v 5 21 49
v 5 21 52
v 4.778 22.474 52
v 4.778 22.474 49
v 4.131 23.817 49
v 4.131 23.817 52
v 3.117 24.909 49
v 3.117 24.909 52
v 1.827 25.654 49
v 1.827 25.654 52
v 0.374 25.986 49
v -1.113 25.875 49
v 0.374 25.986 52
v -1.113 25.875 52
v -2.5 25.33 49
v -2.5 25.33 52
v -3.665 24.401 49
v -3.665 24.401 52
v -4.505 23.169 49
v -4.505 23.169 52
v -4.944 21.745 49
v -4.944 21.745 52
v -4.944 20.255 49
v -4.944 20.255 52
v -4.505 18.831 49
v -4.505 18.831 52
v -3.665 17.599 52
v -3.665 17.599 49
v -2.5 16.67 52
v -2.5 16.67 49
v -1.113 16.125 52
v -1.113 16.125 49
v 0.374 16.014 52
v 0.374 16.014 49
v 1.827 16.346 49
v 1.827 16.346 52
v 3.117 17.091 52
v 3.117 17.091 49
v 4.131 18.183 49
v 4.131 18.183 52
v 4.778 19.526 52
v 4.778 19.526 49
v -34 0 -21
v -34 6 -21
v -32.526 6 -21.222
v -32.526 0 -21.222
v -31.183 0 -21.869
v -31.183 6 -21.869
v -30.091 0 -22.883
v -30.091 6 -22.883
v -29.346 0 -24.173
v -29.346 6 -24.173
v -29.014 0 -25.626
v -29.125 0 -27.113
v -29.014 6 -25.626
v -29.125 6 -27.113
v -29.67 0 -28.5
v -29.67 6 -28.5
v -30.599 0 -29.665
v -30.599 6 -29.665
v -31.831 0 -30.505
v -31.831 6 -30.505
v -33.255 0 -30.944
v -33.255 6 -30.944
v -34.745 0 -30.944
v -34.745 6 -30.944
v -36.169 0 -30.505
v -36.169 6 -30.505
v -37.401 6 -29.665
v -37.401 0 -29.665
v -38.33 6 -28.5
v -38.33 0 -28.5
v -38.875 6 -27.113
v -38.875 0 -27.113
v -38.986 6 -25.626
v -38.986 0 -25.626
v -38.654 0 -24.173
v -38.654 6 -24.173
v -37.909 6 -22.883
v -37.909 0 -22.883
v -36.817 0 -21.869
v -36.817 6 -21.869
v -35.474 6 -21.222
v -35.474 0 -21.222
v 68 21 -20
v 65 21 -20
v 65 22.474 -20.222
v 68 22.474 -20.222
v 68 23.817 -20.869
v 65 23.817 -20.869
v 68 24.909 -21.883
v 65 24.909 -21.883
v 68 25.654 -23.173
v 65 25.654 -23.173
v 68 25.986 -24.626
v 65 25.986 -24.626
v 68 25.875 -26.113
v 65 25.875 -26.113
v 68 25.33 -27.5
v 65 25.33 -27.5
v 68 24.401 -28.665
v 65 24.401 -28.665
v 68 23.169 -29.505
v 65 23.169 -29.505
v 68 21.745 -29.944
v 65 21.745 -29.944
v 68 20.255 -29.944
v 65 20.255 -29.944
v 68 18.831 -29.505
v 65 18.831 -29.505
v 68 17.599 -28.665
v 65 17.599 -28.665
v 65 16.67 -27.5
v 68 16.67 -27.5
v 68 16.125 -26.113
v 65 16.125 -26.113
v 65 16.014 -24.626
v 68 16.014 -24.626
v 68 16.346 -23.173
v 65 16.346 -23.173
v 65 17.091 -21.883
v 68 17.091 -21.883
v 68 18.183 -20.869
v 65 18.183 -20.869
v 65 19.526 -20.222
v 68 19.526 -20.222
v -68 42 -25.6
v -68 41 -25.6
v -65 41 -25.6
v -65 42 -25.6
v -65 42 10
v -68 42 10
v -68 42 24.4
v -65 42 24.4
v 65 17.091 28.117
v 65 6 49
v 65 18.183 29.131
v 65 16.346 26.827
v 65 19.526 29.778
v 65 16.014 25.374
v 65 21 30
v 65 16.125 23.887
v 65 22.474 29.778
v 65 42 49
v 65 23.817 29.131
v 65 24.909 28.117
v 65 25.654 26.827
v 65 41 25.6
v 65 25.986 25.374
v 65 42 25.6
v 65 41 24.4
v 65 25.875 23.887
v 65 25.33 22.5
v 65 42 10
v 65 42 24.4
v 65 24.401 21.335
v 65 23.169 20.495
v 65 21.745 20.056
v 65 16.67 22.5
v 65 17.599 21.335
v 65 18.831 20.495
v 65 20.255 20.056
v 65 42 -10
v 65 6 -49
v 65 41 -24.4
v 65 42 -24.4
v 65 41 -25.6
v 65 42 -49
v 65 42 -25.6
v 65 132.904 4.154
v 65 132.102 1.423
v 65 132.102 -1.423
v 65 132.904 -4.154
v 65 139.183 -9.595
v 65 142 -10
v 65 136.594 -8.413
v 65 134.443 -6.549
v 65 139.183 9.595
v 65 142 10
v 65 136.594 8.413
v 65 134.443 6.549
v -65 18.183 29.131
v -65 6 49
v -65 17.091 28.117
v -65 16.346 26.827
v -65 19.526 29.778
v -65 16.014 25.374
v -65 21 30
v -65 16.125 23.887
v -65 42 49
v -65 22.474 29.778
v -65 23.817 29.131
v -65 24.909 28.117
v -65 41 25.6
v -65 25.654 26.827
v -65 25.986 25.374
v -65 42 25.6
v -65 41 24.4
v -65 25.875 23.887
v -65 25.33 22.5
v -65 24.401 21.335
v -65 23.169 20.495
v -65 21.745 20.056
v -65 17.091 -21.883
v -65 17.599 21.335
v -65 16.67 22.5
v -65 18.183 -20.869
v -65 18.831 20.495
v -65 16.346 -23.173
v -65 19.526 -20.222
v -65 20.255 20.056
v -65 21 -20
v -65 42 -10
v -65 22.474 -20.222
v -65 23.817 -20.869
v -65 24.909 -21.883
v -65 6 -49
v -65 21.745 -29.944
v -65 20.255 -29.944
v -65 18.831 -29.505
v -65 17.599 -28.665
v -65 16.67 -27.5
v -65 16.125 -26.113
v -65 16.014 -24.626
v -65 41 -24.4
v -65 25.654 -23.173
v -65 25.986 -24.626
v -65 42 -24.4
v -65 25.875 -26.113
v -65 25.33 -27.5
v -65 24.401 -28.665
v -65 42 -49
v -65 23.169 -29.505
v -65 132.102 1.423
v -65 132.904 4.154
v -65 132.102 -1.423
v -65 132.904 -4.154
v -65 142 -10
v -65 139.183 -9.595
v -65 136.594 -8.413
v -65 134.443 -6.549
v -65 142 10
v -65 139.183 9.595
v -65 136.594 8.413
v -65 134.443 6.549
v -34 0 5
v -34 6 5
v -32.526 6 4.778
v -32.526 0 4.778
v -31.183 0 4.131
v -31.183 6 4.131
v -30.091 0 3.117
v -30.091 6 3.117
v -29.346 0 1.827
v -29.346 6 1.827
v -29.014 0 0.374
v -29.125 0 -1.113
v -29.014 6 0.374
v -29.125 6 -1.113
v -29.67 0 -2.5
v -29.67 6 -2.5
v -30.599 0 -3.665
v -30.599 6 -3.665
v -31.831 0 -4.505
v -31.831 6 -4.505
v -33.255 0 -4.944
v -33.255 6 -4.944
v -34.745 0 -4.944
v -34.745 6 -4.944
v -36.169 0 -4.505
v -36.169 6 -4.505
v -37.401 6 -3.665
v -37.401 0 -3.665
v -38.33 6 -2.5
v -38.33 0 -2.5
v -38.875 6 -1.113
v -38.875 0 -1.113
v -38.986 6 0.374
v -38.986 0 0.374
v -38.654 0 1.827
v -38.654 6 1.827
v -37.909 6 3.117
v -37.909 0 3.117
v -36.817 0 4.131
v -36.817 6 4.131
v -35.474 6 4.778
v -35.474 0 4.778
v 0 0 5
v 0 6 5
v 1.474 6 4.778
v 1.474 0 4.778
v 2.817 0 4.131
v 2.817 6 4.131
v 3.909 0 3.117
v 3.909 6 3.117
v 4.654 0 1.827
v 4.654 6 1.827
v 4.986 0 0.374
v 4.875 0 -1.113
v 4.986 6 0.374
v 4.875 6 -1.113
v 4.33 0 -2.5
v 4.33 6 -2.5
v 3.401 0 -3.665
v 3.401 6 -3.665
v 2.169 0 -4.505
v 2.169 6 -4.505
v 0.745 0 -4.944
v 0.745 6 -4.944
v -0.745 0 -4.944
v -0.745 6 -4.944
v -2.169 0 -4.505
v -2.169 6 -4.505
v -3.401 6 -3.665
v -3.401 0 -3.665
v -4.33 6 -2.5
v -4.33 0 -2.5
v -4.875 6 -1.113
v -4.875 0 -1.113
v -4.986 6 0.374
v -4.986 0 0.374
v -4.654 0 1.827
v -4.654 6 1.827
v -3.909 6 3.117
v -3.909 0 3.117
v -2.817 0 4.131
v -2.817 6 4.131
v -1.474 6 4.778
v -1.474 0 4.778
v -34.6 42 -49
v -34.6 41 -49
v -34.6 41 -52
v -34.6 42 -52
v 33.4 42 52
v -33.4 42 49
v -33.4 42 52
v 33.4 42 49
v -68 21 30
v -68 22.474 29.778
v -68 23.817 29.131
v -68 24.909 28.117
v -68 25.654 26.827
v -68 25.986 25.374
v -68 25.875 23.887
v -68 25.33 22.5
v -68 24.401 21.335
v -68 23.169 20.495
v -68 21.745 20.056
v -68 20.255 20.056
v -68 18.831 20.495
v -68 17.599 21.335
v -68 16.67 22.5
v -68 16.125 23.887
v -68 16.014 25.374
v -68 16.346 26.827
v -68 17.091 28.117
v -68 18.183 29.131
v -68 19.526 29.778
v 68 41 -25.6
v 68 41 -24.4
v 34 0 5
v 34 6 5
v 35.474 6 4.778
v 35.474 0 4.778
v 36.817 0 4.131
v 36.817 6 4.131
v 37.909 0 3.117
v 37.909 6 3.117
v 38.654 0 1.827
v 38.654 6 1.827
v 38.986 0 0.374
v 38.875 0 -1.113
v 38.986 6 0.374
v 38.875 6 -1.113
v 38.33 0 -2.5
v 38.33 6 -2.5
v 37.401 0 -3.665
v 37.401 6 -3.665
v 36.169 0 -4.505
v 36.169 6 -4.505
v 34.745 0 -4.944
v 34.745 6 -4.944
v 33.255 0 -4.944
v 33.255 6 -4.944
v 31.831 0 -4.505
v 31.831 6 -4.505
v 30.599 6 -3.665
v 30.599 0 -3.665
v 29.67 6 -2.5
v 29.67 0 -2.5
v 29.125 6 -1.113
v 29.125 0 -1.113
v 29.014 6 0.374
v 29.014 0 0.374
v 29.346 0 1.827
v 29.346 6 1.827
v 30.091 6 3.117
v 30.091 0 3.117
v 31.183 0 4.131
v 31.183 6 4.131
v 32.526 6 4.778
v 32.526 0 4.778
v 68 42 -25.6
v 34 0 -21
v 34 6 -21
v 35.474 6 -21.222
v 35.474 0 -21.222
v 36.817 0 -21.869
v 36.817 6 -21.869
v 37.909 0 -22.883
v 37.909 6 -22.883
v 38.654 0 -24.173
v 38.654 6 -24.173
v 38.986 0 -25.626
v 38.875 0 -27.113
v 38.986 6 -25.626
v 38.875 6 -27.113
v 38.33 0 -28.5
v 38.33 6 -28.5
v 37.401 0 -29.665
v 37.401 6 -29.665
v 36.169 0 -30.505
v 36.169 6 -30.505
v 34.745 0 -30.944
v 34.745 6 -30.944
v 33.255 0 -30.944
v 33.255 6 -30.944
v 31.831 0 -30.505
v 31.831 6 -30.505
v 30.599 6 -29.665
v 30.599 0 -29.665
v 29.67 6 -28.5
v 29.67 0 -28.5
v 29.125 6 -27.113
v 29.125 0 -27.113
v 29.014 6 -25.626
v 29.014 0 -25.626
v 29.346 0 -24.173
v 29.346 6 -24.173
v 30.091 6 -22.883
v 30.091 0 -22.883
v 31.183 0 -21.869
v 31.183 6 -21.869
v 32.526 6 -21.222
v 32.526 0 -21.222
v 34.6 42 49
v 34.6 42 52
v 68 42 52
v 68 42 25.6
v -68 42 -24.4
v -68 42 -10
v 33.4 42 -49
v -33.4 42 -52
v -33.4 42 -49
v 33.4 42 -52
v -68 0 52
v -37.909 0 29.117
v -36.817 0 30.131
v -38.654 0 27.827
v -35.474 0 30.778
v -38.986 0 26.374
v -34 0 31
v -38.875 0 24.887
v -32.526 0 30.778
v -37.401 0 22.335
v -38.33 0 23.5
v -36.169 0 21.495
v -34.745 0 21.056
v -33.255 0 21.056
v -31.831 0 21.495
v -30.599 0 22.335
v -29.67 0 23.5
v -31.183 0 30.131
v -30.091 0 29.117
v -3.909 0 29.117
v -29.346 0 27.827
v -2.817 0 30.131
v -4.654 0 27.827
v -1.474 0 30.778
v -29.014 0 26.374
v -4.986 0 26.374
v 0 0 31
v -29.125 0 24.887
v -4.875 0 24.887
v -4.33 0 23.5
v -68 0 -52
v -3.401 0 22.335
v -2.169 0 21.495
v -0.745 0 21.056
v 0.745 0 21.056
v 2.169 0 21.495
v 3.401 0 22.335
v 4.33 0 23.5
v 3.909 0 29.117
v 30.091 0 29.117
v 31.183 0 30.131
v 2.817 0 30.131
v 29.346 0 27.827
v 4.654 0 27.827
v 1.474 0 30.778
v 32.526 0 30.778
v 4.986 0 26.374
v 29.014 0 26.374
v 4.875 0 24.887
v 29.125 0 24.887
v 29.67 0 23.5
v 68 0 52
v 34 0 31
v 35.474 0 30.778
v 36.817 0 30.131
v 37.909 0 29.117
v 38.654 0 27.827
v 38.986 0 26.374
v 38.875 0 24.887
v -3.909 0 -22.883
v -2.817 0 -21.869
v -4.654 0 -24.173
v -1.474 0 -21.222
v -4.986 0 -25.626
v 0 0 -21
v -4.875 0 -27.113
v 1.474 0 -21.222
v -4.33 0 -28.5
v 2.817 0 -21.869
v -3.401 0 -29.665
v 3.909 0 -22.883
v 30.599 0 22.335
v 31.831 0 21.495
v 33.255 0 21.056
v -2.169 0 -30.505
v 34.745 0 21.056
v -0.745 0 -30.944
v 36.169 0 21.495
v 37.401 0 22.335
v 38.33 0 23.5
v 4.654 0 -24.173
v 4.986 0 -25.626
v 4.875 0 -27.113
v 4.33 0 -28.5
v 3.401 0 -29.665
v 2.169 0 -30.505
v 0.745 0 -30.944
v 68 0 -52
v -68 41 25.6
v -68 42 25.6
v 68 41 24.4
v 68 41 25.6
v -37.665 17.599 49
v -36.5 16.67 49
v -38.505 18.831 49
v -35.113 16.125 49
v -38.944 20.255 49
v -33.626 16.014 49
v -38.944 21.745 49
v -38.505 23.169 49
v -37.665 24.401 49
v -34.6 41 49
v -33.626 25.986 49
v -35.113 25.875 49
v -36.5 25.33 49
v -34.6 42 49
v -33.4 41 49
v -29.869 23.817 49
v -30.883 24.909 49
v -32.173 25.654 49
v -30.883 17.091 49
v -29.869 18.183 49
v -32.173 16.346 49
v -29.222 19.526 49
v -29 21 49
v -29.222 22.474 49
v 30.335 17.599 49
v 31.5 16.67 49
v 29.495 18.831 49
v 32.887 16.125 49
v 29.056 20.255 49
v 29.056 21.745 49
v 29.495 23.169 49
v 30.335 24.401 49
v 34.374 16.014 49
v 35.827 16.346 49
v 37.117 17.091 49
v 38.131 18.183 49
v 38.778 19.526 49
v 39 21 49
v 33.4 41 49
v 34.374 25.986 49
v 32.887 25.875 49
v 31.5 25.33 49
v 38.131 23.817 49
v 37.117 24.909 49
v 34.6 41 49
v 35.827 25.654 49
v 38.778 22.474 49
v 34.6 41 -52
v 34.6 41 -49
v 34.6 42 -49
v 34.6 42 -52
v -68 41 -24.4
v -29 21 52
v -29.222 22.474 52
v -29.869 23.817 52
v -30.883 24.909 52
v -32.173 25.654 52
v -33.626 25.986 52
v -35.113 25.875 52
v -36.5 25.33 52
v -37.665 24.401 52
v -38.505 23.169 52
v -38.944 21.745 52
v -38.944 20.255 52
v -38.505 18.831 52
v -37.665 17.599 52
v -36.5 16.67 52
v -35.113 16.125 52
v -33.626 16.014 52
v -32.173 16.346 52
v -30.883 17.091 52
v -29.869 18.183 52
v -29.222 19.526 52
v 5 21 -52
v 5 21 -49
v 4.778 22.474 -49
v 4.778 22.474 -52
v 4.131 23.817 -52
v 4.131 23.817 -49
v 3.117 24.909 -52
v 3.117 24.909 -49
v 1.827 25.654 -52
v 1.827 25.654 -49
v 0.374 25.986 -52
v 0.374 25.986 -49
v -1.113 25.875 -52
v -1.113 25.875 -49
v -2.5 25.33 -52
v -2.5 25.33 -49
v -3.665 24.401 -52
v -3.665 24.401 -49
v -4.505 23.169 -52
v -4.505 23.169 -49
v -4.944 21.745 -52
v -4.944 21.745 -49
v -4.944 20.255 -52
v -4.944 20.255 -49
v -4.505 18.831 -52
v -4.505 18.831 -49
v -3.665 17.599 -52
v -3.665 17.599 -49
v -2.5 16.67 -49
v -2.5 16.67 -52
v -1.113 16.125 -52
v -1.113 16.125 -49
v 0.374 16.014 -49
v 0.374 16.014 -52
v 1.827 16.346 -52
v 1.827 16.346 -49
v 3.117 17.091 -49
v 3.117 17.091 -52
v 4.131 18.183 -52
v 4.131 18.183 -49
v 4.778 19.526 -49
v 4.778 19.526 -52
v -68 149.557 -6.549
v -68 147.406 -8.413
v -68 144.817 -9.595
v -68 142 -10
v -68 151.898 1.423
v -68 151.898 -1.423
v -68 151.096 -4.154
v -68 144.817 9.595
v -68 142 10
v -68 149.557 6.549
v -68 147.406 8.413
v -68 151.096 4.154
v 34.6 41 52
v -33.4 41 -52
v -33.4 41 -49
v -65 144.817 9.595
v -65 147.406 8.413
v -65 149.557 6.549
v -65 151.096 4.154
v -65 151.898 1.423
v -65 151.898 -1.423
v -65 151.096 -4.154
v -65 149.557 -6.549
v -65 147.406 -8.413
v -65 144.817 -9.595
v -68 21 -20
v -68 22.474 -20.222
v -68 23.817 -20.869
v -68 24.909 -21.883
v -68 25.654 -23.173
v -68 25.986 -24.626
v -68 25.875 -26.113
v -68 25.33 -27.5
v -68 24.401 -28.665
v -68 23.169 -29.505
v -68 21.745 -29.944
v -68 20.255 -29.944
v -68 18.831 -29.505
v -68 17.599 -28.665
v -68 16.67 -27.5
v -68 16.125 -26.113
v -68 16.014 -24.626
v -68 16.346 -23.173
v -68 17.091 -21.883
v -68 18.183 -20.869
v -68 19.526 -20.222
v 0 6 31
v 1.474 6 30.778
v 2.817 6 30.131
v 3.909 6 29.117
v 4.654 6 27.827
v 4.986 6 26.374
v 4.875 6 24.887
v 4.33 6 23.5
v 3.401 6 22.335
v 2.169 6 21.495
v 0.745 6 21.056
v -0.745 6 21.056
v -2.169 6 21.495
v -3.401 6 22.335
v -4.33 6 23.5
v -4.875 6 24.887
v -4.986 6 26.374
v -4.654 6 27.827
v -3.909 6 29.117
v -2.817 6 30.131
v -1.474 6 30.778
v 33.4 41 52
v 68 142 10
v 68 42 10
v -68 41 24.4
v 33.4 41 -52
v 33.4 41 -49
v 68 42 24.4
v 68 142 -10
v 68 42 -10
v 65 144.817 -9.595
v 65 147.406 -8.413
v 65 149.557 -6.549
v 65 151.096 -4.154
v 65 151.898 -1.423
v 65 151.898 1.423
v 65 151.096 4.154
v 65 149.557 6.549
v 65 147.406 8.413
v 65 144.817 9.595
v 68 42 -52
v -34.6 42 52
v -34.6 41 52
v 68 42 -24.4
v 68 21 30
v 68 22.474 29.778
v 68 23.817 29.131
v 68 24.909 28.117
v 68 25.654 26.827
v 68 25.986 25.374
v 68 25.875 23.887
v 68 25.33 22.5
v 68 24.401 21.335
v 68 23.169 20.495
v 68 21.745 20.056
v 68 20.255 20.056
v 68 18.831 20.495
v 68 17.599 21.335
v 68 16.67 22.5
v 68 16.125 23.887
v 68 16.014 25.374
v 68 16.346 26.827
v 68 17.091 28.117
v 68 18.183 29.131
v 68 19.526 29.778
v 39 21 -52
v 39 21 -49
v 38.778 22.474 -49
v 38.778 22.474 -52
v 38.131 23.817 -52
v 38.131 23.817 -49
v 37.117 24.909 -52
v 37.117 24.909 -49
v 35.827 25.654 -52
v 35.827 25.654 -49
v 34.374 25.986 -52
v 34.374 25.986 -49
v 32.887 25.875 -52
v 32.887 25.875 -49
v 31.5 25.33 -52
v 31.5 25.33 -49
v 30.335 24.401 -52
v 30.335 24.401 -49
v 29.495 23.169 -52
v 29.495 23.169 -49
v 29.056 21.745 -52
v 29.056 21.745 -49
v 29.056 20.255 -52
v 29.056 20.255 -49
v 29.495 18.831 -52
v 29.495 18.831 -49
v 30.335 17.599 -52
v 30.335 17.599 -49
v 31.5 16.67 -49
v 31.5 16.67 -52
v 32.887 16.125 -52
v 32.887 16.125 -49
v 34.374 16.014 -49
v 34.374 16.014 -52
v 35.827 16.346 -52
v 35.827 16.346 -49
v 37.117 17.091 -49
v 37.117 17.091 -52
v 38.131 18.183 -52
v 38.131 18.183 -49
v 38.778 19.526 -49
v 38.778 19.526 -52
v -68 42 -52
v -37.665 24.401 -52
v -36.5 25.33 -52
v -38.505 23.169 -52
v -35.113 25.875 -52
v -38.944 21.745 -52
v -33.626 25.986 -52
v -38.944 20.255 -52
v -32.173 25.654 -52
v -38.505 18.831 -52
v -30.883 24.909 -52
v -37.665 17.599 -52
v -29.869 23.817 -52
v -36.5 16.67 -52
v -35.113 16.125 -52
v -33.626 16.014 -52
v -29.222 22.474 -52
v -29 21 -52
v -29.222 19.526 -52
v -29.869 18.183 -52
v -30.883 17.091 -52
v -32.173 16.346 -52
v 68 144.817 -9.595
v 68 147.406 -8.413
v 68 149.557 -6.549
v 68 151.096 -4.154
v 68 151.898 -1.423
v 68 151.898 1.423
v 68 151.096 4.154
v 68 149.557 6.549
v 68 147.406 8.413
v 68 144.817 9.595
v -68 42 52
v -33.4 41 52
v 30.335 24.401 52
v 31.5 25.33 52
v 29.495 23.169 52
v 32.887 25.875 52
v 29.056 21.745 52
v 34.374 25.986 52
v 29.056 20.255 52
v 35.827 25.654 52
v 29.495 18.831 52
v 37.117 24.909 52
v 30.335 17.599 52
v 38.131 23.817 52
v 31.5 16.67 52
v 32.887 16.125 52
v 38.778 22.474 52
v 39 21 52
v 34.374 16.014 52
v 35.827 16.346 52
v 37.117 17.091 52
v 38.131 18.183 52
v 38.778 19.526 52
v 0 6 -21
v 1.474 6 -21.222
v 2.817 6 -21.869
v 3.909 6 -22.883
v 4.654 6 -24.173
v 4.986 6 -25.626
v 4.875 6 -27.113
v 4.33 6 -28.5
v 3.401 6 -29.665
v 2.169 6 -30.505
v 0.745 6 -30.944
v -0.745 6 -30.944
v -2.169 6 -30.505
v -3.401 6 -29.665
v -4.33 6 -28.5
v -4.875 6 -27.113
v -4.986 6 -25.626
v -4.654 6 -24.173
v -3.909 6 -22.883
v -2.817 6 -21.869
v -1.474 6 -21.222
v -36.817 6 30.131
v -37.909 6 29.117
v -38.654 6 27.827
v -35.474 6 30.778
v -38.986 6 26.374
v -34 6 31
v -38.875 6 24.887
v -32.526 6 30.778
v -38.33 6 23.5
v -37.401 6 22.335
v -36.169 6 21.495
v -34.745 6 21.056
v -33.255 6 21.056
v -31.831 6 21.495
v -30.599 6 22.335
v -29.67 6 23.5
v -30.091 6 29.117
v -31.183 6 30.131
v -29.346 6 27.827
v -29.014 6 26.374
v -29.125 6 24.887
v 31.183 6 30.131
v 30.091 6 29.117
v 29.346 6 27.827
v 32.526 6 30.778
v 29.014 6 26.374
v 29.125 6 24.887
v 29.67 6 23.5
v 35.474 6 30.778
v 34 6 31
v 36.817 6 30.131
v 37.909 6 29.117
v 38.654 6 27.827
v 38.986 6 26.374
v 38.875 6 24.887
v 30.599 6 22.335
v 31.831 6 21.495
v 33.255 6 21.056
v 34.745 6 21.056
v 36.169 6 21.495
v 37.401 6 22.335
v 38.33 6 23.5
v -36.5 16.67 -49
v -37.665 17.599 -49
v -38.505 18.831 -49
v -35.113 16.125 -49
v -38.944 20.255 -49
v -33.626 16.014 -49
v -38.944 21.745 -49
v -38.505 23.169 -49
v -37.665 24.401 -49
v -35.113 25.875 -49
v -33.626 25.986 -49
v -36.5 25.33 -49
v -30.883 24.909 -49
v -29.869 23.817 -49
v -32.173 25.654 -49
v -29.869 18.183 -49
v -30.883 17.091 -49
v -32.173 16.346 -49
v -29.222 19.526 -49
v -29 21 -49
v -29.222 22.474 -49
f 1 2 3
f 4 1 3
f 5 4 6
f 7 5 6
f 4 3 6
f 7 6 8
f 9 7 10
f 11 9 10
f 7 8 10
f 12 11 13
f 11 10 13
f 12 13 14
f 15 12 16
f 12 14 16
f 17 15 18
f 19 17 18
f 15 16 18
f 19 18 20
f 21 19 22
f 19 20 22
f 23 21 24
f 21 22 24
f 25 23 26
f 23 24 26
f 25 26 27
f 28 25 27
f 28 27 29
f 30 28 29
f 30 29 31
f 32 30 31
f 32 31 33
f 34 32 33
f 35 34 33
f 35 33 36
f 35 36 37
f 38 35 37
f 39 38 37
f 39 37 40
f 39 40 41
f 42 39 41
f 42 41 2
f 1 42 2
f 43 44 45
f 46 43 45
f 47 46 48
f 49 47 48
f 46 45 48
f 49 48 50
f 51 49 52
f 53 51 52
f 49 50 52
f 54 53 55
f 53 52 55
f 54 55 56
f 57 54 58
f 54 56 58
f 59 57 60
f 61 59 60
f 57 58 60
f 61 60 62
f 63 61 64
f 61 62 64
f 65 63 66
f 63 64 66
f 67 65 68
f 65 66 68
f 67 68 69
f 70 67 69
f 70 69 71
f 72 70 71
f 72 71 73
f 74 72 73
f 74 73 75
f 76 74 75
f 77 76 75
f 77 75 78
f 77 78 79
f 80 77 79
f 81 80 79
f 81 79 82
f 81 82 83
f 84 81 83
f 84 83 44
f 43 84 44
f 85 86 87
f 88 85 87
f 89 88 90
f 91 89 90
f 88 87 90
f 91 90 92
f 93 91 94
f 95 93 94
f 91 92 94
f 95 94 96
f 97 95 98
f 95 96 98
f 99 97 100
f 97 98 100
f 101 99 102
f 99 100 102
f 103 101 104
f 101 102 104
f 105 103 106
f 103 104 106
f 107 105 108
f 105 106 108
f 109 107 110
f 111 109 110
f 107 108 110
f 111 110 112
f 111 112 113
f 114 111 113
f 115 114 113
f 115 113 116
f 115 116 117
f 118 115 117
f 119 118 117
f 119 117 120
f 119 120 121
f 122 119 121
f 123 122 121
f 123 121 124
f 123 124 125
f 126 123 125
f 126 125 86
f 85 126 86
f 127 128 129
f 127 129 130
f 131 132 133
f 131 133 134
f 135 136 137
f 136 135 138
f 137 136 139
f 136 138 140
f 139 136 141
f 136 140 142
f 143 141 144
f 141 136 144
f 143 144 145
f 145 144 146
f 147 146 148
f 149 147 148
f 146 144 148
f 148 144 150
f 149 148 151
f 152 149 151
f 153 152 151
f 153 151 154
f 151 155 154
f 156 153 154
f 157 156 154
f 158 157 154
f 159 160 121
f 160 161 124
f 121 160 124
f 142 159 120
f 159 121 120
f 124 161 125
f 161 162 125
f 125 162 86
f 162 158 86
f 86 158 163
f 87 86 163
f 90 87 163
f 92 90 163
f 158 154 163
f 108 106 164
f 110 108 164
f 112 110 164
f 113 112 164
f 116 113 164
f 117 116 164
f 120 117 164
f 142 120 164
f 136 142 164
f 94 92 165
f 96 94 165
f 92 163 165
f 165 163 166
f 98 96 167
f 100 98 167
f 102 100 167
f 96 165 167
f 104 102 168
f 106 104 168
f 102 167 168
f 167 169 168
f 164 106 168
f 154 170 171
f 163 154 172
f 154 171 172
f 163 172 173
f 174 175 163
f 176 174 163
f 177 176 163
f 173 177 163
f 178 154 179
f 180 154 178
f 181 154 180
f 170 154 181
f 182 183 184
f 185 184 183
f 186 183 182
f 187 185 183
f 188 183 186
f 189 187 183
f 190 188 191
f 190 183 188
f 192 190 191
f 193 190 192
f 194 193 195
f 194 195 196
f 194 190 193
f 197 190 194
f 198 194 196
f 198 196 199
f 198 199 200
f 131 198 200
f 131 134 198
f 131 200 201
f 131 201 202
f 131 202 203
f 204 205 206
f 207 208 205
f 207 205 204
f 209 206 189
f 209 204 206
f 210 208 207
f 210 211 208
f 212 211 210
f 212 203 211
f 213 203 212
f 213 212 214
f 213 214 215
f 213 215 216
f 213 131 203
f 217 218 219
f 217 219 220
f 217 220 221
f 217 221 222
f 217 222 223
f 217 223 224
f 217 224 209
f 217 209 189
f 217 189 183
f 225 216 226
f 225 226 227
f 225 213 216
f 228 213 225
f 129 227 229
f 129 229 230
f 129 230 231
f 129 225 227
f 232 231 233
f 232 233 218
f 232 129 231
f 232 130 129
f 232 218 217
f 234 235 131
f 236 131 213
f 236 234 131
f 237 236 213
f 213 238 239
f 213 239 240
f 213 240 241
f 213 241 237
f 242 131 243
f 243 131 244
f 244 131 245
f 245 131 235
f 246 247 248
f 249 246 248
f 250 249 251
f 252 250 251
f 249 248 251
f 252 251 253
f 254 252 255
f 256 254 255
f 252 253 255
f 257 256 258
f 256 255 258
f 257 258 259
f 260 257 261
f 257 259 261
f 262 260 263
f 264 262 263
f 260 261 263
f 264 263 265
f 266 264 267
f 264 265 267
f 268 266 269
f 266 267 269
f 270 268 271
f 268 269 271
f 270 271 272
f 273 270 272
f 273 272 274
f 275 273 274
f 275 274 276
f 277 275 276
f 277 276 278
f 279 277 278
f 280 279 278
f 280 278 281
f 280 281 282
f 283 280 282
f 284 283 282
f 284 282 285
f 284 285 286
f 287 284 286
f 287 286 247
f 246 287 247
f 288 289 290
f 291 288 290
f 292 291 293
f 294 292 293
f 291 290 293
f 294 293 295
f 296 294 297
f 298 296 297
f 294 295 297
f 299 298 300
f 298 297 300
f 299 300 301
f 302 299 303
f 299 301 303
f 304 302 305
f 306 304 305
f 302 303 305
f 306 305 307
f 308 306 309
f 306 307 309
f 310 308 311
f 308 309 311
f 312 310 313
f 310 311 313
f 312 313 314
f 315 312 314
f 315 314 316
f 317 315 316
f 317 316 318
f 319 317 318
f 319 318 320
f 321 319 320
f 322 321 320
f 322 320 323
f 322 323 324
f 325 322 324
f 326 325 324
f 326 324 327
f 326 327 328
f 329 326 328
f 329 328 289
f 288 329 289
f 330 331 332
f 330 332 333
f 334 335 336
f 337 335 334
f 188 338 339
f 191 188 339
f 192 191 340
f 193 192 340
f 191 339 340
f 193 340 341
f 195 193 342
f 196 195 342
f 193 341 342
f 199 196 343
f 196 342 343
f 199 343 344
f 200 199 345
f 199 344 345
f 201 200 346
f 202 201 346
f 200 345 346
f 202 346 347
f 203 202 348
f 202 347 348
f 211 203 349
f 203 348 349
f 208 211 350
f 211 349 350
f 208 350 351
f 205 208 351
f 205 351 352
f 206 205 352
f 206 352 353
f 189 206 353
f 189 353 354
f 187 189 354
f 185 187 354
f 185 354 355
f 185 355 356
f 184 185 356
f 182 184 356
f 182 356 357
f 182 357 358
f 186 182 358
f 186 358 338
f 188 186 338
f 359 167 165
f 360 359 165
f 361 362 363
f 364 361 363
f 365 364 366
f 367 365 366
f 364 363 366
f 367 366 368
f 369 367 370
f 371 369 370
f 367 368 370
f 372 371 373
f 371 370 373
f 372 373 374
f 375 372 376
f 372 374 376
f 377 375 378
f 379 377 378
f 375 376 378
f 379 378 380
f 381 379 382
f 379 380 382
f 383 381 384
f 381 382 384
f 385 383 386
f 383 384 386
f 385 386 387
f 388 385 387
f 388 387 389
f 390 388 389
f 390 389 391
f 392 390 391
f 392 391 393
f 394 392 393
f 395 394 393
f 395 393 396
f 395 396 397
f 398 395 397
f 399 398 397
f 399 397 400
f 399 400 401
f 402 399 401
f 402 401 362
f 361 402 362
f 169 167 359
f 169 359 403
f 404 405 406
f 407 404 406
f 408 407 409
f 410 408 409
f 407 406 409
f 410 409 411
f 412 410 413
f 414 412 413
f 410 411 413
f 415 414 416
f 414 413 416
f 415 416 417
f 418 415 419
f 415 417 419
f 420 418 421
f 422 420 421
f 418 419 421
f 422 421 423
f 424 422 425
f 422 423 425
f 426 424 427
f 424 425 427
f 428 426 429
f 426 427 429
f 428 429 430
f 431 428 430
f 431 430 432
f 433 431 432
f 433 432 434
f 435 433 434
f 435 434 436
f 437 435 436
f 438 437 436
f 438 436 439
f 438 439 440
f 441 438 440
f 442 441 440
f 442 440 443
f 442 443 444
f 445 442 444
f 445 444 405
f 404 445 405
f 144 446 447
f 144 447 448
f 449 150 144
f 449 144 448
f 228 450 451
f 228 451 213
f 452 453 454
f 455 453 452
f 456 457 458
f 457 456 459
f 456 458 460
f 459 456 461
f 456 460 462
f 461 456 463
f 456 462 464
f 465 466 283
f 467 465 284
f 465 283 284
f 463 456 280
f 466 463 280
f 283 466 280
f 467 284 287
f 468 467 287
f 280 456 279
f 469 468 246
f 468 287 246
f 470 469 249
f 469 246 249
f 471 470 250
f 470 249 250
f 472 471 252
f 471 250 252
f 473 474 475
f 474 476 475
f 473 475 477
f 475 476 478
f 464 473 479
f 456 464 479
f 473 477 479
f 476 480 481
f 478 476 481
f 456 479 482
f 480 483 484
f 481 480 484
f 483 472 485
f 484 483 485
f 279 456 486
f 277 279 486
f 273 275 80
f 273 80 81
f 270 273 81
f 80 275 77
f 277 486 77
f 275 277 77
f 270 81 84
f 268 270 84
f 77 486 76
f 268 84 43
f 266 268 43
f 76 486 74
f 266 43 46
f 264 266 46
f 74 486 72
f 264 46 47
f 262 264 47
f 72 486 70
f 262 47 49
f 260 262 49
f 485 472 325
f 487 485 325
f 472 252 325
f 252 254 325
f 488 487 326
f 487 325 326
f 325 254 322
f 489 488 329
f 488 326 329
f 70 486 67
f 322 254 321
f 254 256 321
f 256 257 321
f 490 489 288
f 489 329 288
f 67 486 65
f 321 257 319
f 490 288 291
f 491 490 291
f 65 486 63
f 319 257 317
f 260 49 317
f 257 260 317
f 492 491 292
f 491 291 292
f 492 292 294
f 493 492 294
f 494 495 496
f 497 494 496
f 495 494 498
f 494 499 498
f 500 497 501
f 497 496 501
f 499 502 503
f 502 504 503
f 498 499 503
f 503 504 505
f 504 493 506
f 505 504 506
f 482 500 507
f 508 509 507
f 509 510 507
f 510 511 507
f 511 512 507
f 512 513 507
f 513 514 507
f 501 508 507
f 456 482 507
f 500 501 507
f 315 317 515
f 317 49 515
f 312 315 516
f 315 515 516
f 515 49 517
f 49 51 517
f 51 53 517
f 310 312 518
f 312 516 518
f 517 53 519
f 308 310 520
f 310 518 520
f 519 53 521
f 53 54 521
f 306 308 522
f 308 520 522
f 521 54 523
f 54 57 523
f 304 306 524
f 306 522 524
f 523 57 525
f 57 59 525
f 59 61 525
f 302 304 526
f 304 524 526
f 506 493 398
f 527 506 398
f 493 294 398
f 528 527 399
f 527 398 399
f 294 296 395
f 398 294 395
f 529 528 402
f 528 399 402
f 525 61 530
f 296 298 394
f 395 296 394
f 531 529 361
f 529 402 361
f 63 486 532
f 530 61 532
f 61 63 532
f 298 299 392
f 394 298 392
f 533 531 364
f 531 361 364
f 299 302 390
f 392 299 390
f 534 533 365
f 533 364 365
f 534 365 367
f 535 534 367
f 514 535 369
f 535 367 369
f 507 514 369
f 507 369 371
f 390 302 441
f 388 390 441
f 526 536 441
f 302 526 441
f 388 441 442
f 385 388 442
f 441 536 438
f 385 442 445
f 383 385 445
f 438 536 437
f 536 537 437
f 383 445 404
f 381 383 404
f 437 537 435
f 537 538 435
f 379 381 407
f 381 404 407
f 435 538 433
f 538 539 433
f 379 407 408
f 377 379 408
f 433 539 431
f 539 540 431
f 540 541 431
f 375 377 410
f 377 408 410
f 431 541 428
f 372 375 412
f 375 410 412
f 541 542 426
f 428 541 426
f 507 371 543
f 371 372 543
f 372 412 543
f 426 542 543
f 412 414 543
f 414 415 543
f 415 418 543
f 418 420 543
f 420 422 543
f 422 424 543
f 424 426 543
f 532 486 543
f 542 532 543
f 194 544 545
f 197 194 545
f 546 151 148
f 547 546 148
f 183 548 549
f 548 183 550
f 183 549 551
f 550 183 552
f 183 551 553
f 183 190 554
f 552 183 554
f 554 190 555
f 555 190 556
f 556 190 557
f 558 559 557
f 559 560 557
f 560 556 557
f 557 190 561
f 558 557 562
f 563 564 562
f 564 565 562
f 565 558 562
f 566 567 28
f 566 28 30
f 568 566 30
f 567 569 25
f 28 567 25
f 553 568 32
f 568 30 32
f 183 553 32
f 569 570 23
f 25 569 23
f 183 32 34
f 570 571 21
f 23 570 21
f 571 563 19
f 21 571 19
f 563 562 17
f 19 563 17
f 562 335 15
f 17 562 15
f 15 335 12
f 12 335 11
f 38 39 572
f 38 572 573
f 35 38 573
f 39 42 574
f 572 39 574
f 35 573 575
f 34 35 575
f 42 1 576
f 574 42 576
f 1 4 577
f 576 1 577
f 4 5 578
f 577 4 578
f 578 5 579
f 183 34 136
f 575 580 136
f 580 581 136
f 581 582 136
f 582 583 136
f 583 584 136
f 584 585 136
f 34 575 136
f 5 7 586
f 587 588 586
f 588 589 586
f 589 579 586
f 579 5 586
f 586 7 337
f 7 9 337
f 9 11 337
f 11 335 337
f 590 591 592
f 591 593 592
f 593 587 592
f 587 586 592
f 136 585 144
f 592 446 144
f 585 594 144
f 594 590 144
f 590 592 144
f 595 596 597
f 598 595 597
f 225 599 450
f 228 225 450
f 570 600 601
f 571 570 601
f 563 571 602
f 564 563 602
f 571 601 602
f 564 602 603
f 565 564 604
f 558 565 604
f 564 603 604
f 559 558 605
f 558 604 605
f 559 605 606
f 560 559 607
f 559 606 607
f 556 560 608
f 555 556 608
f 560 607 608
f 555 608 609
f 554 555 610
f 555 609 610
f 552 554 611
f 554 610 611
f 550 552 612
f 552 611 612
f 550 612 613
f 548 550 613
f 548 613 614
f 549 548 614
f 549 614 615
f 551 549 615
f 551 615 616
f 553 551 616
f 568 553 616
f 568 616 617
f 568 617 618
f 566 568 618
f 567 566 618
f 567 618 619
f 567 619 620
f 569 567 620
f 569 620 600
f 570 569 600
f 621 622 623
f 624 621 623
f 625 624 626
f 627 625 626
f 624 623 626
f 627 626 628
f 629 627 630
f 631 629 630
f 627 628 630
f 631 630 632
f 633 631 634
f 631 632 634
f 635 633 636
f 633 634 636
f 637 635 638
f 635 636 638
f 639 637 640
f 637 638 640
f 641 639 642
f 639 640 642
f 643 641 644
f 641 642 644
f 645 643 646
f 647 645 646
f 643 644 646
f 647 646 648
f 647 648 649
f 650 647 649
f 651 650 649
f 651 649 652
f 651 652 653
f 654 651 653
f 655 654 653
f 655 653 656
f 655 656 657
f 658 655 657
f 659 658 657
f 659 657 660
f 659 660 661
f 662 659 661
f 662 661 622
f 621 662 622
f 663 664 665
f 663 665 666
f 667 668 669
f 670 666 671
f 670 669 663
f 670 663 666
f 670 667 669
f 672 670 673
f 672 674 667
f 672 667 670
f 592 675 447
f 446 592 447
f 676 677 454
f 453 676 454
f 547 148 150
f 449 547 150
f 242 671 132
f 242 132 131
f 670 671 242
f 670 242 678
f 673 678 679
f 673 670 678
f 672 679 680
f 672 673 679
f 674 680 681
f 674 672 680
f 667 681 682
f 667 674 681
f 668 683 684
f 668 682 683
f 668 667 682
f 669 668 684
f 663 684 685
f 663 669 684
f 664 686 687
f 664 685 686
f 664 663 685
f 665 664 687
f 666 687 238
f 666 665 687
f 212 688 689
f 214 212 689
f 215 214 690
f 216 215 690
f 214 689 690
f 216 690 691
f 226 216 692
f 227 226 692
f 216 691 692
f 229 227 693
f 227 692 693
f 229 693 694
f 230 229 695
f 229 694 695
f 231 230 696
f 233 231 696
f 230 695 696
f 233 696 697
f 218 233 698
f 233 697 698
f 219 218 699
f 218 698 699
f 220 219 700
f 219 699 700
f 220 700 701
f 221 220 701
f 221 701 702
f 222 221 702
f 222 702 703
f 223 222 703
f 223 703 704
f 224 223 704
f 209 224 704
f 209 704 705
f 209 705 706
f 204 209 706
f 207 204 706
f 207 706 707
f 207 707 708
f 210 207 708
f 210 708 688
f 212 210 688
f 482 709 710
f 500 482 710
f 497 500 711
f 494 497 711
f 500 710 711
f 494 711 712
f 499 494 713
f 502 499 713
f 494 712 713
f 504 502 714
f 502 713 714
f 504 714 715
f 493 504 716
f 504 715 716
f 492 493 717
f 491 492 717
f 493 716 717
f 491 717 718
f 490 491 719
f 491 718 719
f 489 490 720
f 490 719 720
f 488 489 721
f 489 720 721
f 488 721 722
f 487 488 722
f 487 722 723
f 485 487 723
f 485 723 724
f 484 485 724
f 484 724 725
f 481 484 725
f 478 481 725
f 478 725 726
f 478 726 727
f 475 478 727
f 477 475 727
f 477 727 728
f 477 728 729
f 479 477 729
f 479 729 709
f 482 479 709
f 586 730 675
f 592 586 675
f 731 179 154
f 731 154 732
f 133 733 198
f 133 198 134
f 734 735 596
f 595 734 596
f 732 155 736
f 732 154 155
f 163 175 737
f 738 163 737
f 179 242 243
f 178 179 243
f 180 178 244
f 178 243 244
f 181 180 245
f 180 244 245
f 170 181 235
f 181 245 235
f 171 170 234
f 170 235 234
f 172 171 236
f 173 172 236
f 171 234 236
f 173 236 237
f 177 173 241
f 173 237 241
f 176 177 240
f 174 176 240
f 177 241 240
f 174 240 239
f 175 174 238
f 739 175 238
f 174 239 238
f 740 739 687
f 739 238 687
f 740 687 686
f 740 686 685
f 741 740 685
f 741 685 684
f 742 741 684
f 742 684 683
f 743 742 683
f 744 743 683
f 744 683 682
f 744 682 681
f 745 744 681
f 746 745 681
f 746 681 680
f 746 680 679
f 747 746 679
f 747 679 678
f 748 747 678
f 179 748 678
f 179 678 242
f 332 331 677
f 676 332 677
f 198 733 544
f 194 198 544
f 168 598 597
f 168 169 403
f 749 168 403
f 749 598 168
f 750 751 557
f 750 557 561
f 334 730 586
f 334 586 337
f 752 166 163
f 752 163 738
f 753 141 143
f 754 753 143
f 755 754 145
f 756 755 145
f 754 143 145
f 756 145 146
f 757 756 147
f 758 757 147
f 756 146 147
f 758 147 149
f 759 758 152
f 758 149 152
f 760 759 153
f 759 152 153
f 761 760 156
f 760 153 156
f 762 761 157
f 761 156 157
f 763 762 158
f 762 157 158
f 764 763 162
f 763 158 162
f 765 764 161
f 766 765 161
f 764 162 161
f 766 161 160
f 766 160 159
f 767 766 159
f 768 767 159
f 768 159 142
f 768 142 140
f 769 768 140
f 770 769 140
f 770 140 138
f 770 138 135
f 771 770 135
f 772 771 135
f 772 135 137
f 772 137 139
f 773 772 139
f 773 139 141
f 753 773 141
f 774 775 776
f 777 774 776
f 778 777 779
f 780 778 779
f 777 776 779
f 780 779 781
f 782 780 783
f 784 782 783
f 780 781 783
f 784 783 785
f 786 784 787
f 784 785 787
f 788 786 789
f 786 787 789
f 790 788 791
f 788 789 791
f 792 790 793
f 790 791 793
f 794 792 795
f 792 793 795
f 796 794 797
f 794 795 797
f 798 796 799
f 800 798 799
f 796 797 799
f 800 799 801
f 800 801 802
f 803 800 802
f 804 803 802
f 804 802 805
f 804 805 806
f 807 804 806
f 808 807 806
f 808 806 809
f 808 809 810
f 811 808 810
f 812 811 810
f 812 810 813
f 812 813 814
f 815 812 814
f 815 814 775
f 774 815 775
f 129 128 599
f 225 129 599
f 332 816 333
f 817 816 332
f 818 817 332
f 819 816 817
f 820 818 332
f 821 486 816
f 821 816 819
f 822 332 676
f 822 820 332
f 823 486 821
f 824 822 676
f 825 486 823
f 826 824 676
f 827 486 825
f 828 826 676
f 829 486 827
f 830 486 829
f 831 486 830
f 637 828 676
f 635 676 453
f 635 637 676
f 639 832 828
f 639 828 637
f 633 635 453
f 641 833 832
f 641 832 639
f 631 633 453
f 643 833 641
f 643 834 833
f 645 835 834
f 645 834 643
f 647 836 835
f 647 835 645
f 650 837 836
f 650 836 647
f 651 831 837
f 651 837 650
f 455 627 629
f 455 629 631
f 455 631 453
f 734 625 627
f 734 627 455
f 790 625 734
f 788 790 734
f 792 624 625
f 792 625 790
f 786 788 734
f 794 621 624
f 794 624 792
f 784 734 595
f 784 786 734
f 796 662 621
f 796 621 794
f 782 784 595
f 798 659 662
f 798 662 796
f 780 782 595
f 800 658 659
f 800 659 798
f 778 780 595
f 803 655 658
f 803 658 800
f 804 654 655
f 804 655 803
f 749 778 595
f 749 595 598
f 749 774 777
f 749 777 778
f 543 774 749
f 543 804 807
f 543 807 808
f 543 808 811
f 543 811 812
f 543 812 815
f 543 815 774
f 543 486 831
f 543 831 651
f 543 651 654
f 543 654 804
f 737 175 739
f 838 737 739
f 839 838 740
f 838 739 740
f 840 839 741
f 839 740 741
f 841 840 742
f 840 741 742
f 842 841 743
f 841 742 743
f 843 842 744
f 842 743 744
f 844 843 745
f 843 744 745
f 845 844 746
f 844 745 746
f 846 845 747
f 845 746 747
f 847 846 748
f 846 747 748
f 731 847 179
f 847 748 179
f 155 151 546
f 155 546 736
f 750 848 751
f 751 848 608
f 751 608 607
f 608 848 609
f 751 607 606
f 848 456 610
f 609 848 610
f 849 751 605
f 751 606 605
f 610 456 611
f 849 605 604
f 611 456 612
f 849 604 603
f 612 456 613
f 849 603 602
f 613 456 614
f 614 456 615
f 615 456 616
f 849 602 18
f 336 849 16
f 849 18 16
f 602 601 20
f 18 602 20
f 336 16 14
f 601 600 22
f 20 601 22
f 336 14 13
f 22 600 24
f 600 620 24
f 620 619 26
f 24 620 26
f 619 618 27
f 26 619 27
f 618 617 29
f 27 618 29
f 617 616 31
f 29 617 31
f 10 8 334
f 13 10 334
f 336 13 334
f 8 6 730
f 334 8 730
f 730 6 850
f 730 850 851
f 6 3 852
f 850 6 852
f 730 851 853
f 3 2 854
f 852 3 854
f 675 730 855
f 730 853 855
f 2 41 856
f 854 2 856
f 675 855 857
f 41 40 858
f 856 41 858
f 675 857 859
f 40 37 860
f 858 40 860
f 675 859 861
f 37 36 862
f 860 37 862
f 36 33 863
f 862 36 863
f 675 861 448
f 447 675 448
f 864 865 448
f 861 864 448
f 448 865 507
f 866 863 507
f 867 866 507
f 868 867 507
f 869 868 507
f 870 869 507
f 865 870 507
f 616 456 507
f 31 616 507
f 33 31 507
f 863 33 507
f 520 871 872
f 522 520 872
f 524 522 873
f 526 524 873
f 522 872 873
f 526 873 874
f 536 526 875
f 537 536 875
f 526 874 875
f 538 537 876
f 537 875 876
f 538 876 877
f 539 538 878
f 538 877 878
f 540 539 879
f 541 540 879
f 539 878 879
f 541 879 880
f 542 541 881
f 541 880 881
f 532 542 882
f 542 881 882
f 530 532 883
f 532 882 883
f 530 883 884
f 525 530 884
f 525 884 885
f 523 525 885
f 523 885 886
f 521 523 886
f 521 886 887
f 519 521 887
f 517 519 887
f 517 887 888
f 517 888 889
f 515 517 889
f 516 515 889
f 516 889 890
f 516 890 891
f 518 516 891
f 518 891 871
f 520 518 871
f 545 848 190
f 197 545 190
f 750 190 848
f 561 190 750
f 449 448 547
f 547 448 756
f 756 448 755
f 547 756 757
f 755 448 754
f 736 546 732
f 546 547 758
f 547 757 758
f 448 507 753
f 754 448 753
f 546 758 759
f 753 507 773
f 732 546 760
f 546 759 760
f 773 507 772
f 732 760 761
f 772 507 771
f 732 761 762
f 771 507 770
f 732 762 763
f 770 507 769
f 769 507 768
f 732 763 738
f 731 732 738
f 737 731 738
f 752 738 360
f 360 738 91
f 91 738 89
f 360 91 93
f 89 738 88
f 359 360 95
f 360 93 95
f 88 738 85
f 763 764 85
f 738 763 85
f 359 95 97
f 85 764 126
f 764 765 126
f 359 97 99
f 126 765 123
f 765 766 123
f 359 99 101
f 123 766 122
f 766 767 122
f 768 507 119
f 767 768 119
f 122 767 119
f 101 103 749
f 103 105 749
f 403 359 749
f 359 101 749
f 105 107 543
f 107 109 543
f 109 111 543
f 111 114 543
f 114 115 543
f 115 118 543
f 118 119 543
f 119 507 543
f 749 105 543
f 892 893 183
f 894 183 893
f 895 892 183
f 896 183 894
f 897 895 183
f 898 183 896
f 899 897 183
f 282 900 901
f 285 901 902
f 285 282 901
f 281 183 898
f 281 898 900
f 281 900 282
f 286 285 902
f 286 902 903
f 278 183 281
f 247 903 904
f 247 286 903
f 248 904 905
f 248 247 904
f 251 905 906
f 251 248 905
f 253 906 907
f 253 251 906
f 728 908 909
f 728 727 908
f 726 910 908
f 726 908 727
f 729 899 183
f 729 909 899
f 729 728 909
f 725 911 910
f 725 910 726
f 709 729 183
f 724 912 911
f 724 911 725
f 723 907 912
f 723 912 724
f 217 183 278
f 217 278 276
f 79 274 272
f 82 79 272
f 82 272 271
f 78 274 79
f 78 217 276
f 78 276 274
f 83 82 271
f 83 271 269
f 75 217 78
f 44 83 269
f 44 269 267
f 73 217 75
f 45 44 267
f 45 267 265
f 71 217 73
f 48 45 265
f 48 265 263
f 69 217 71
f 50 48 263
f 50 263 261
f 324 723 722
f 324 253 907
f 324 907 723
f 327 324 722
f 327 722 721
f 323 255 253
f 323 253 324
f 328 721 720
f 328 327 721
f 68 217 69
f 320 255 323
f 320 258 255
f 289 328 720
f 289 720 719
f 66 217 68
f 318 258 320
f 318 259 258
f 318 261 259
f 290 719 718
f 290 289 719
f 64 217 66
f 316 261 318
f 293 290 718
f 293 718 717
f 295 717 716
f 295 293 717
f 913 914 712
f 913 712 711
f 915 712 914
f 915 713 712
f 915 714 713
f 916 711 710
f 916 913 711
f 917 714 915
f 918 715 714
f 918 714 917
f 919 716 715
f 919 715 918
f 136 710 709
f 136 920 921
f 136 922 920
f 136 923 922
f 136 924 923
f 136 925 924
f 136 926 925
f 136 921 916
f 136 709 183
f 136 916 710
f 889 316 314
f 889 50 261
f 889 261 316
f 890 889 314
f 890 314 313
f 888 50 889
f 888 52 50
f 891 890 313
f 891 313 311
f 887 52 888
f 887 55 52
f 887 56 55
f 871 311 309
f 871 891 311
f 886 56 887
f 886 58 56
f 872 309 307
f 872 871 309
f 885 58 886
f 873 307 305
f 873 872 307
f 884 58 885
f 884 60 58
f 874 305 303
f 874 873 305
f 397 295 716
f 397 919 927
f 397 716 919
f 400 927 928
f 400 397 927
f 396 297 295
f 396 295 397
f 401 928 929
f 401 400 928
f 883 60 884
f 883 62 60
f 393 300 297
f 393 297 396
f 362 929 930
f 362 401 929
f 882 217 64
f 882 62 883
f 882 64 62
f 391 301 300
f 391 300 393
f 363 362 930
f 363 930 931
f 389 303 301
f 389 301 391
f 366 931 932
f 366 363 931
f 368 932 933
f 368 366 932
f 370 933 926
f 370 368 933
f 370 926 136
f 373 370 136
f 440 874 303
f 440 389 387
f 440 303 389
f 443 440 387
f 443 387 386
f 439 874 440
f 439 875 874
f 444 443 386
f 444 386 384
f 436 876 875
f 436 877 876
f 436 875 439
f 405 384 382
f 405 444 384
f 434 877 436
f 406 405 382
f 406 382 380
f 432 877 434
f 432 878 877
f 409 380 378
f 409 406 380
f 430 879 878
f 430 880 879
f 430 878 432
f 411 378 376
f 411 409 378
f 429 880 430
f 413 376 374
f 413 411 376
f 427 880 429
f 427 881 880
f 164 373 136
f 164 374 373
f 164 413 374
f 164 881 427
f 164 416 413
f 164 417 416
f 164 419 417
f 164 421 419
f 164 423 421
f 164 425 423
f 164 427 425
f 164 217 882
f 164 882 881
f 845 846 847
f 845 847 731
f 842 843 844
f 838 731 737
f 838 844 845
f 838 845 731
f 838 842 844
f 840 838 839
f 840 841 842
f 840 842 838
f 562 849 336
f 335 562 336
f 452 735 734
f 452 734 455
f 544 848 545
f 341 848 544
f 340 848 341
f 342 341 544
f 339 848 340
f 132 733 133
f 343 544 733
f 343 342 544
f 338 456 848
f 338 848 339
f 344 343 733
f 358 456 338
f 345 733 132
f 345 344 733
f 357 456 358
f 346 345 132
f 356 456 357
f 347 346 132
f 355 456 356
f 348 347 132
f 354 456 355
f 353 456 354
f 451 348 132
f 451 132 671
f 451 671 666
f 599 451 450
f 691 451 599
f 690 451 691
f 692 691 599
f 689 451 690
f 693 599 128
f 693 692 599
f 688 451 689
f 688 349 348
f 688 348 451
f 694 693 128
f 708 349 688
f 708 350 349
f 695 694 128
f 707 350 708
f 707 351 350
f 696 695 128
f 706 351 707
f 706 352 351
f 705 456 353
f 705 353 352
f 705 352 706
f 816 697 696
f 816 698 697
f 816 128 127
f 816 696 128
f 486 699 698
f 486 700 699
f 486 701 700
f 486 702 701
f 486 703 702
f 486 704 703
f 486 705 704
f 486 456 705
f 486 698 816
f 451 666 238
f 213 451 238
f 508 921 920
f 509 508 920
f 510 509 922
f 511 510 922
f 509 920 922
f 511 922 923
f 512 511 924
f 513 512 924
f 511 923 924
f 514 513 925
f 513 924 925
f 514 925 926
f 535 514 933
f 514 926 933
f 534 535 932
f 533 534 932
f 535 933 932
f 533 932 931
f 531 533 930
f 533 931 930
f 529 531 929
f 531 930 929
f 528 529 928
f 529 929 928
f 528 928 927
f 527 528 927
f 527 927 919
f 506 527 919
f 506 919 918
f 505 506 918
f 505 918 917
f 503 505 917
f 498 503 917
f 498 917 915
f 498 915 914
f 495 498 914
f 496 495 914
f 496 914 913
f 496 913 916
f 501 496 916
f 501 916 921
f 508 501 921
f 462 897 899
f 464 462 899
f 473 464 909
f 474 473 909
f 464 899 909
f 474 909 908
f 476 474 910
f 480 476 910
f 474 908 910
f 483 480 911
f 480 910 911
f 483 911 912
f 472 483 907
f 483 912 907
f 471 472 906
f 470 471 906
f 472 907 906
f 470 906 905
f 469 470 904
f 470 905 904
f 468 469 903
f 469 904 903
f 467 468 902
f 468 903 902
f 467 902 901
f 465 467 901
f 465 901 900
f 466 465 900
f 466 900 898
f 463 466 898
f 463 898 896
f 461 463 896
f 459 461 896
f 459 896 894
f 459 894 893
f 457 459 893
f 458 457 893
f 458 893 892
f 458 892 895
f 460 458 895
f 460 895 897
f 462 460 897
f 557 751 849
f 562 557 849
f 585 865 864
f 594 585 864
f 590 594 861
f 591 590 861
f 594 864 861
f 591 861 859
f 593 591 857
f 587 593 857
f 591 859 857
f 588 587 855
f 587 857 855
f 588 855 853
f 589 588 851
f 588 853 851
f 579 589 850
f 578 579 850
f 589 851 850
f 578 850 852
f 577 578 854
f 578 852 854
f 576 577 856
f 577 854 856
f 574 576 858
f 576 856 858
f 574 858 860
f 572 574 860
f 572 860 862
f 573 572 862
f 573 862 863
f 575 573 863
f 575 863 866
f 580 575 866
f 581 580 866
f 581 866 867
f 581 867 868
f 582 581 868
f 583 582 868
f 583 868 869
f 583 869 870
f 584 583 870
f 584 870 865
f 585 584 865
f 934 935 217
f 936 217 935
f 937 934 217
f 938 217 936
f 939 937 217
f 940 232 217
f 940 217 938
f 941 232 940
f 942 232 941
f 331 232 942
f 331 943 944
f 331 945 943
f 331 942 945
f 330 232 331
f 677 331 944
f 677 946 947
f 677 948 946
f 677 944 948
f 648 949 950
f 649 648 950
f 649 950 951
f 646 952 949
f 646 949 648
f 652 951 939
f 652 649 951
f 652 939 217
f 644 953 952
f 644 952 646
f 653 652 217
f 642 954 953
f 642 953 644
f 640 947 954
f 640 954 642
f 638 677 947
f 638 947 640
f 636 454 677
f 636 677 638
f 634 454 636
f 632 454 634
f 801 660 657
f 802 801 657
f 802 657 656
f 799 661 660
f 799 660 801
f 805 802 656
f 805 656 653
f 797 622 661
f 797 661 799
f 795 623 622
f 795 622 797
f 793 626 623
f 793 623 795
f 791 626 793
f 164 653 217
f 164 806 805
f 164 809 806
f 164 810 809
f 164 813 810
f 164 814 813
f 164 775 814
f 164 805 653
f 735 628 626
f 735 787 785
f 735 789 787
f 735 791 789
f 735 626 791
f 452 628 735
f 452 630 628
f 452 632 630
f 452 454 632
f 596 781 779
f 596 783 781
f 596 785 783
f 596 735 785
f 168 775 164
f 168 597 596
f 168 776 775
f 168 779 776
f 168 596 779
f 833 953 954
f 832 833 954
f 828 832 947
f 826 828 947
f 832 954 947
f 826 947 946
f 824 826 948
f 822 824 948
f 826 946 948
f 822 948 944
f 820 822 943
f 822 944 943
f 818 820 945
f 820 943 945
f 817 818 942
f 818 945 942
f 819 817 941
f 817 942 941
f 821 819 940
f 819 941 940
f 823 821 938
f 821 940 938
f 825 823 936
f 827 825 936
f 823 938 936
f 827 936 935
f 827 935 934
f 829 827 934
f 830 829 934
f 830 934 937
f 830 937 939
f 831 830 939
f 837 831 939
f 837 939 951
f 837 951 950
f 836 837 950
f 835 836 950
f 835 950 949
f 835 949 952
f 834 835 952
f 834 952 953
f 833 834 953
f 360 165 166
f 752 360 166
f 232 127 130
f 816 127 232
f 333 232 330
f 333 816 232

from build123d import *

# Parameters (mm, degrees)
SKETCH_1_W          = 136
SKETCH_1_H          = 104
EXTRUDE_1_DEPTH     = 42
SKETCH_2_W          = 130
SKETCH_2_H          = 98
CUT_EXTRUDE_1_DEPTH = 36
CUT_EXTRUDE_2_REACH = 94.865
SKETCH_3_R          = 5
SKETCH_4_R          = 5
CUT_EXTRUDE_3_DEPTH = 136
SKETCH_5_R          = 5
CUT_EXTRUDE_4_DEPTH = 104
SKETCH_6_W          = 3
SKETCH_6_H          = 20
EXTRUDE_2_DEPTH     = 100
SKETCH_7_R          = 10
EXTRUDE_3_DEPTH     = 130
EXTRUDE_4_DEPTH     = 3
EXTRUDE_START       = -3
EXTRUDE_5_DEPTH     = 3
SKETCH_10_W         = 1.2
SKETCH_10_H         = 2
CUT_EXTRUDE_5_DEPTH = 104
SKETCH_11_W         = 1.2
SKETCH_11_H         = 2
CUT_EXTRUDE_6_DEPTH = 136


with BuildPart() as part:
    # 草图1 → 凸台-拉伸1 (new body)
    with BuildSketch(Plane(origin=(0, 0, 0), x_dir=(1, 0, 0), z_dir=(0, 1, 0))):
        Rectangle(SKETCH_1_W, SKETCH_1_H)
    extrude(amount=EXTRUDE_1_DEPTH)

    # 草图2 → 切除-拉伸1 (cut)
    with BuildSketch(Plane(origin=(0, 42, 0), x_dir=(1, 0, 0), z_dir=(0, 1, 0))):
        Rectangle(SKETCH_2_W, SKETCH_2_H)
    extrude(amount=-CUT_EXTRUDE_1_DEPTH, mode=Mode.SUBTRACT)

    # 草图3 → 切除-拉伸2 (cut, up to next)
    with BuildSketch(Plane(origin=(0, 6, 0), x_dir=(1, 0, 0), z_dir=(0, 1, 0)), mode=Mode.PRIVATE) as cut_extrude_2_sk1:
        with Locations(Location((-34, 26, 0), (0, 0, 270))):
            Circle(SKETCH_3_R)
    cut_extrude_2_tool1 = extrude(cut_extrude_2_sk1.sketch, amount=-CUT_EXTRUDE_2_REACH, mode=Mode.PRIVATE) & part.part
    # 草图3 → 切除-拉伸2 (cut, up to next)
    with BuildSketch(Plane(origin=(0, 6, 0), x_dir=(1, 0, 0), z_dir=(0, 1, 0)), mode=Mode.PRIVATE) as cut_extrude_2_sk2:
        with Locations(Location((-34, -26, 0), (0, 0, 270))):
            Circle(SKETCH_3_R)
    cut_extrude_2_tool2 = extrude(cut_extrude_2_sk2.sketch, amount=-CUT_EXTRUDE_2_REACH, mode=Mode.PRIVATE) & part.part
    # 草图3 → 切除-拉伸2 (cut, up to next)
    with BuildSketch(Plane(origin=(0, 6, 0), x_dir=(1, 0, 0), z_dir=(0, 1, 0)), mode=Mode.PRIVATE) as cut_extrude_2_sk3:
        with Locations(Location((34, 26, 0), (0, 0, 270))):
            Circle(SKETCH_3_R)
    cut_extrude_2_tool3 = extrude(cut_extrude_2_sk3.sketch, amount=-CUT_EXTRUDE_2_REACH, mode=Mode.PRIVATE) & part.part
    # 草图3 → 切除-拉伸2 (cut, up to next)
    with BuildSketch(Plane(origin=(0, 6, 0), x_dir=(1, 0, 0), z_dir=(0, 1, 0)), mode=Mode.PRIVATE) as cut_extrude_2_sk4:
        with Locations(Location((34, -26, 0), (0, 0, 270))):
            Circle(SKETCH_3_R)
    cut_extrude_2_tool4 = extrude(cut_extrude_2_sk4.sketch, amount=-CUT_EXTRUDE_2_REACH, mode=Mode.PRIVATE) & part.part
    # 草图3 → 切除-拉伸2 (cut, up to next)
    with BuildSketch(Plane(origin=(0, 6, 0), x_dir=(1, 0, 0), z_dir=(0, 1, 0)), mode=Mode.PRIVATE) as cut_extrude_2_sk5:
        with Locations(Location((0, 26, 0), (0, 0, 270))):
            Circle(SKETCH_3_R)
    cut_extrude_2_tool5 = extrude(cut_extrude_2_sk5.sketch, amount=-CUT_EXTRUDE_2_REACH, mode=Mode.PRIVATE) & part.part
    # 草图3 → 切除-拉伸2 (cut, up to next)
    with BuildSketch(Plane(origin=(0, 6, 0), x_dir=(1, 0, 0), z_dir=(0, 1, 0)), mode=Mode.PRIVATE) as cut_extrude_2_sk6:
        with Locations(Location((0, 0, 0), (0, 0, 270))):
            Circle(SKETCH_3_R)
    cut_extrude_2_tool6 = extrude(cut_extrude_2_sk6.sketch, amount=-CUT_EXTRUDE_2_REACH, mode=Mode.PRIVATE) & part.part
    # 草图3 → 切除-拉伸2 (cut, up to next)
    with BuildSketch(Plane(origin=(0, 6, 0), x_dir=(1, 0, 0), z_dir=(0, 1, 0)), mode=Mode.PRIVATE) as cut_extrude_2_sk7:
        with Locations(Location((-34, 0, 0), (0, 0, 270))):
            Circle(SKETCH_3_R)
    cut_extrude_2_tool7 = extrude(cut_extrude_2_sk7.sketch, amount=-CUT_EXTRUDE_2_REACH, mode=Mode.PRIVATE) & part.part
    # 草图3 → 切除-拉伸2 (cut, up to next)
    with BuildSketch(Plane(origin=(0, 6, 0), x_dir=(1, 0, 0), z_dir=(0, 1, 0)), mode=Mode.PRIVATE) as cut_extrude_2_sk8:
        with Locations(Location((0, -26, 0), (0, 0, 270))):
            Circle(SKETCH_3_R)
    cut_extrude_2_tool8 = extrude(cut_extrude_2_sk8.sketch, amount=-CUT_EXTRUDE_2_REACH, mode=Mode.PRIVATE) & part.part
    # 草图3 → 切除-拉伸2 (cut, up to next)
    with BuildSketch(Plane(origin=(0, 6, 0), x_dir=(1, 0, 0), z_dir=(0, 1, 0)), mode=Mode.PRIVATE) as cut_extrude_2_sk9:
        with Locations(Location((34, 0, 0), (0, 0, 270))):
            Circle(SKETCH_3_R)
    cut_extrude_2_tool9 = extrude(cut_extrude_2_sk9.sketch, amount=-CUT_EXTRUDE_2_REACH, mode=Mode.PRIVATE) & part.part
    add(cut_extrude_2_tool1.solids().sort_by_distance((-34, 6, -26))[0], mode=Mode.SUBTRACT)
    add(cut_extrude_2_tool2.solids().sort_by_distance((-34, 6, 26))[0], mode=Mode.SUBTRACT)
    add(cut_extrude_2_tool3.solids().sort_by_distance((34, 6, -26))[0], mode=Mode.SUBTRACT)
    add(cut_extrude_2_tool4.solids().sort_by_distance((34, 6, 26))[0], mode=Mode.SUBTRACT)
    add(cut_extrude_2_tool5.solids().sort_by_distance((0, 6, -26))[0], mode=Mode.SUBTRACT)
    add(cut_extrude_2_tool6.solids().sort_by_distance((0, 6, 0))[0], mode=Mode.SUBTRACT)
    add(cut_extrude_2_tool7.solids().sort_by_distance((-34, 6, 0))[0], mode=Mode.SUBTRACT)
    add(cut_extrude_2_tool8.solids().sort_by_distance((0, 6, 26))[0], mode=Mode.SUBTRACT)
    add(cut_extrude_2_tool9.solids().sort_by_distance((34, 6, 0))[0], mode=Mode.SUBTRACT)

    # 草图4 → 切除-拉伸3 (cut)
    with BuildSketch(Plane.ZY.offset(68)):
        with Locations((-25, 21)):
            Circle(SKETCH_4_R)
        with Locations((25, 21)):
            Circle(SKETCH_4_R)
    extrude(amount=-CUT_EXTRUDE_3_DEPTH, mode=Mode.SUBTRACT)

    # 草图5 → 切除-拉伸4 (cut)
    with BuildSketch(Plane.XY.offset(52)):
        with Locations((-34, 21)):
            Circle(SKETCH_5_R)
        with Locations((34, 21)):
            Circle(SKETCH_5_R)
        with Locations((0, 21)):
            Circle(SKETCH_5_R)
    extrude(amount=-CUT_EXTRUDE_4_DEPTH, mode=Mode.SUBTRACT)

    # 草图6 → 凸台-拉伸2 (add)
    with BuildSketch(Plane(origin=(0, 42, 0), x_dir=(1, 0, 0), z_dir=(0, 1, 0))):
        with Locations((-66.5, 0)):
            Rectangle(SKETCH_6_W, SKETCH_6_H)
        with Locations((66.5, 0)):
            Rectangle(SKETCH_6_W, SKETCH_6_H)
    extrude(amount=EXTRUDE_2_DEPTH)

    # 草图7 → 凸台-拉伸3 (add)
    with BuildSketch(Plane(origin=(-65, 0, 0), x_dir=(0, 0, -1), z_dir=(1, 0, 0))):
        with Locations(Location((0, 142, 0), (0, 0, 180))):
            Circle(SKETCH_7_R)
    extrude(amount=EXTRUDE_3_DEPTH)

    # 草图8 → 凸台-拉伸4 (add)
    with BuildSketch(Plane.ZY.offset(68)):
        with BuildLine():
            Line((-10, 142), (10, 142))
            ThreePointArc((10, 142), (0, 152), (-10, 142))
        make_face()
    extrude(amount=-EXTRUDE_4_DEPTH)

    # 草图9 → 凸台-拉伸5 (add)
    with BuildSketch(Plane(origin=(68, 0, 0), x_dir=(0, 0, -1), z_dir=(1, 0, 0)).offset(EXTRUDE_START)):
        with BuildLine():
            Line((-10, 142), (10, 142))
            ThreePointArc((10, 142), (0, 152), (-10, 142))
        make_face()
    extrude(amount=EXTRUDE_5_DEPTH)

    # 草图10 → 切除-拉伸5 (cut)
    with BuildSketch(Plane.XY.offset(52)):
        with Locations((-34, 42)):
            Rectangle(SKETCH_10_W, SKETCH_10_H)
        with Locations((34, 42)):
            Rectangle(SKETCH_10_W, SKETCH_10_H)
    extrude(amount=-CUT_EXTRUDE_5_DEPTH, mode=Mode.SUBTRACT)

    # 草图11 → 切除-拉伸6 (cut)
    with BuildSketch(Plane.ZY.offset(68)):
        with Locations((-25, 42)):
            Rectangle(SKETCH_11_W, SKETCH_11_H)
        with Locations((25, 42)):
            Rectangle(SKETCH_11_W, SKETCH_11_H)
    extrude(amount=-CUT_EXTRUDE_6_DEPTH, mode=Mode.SUBTRACT)


solid = part.part
